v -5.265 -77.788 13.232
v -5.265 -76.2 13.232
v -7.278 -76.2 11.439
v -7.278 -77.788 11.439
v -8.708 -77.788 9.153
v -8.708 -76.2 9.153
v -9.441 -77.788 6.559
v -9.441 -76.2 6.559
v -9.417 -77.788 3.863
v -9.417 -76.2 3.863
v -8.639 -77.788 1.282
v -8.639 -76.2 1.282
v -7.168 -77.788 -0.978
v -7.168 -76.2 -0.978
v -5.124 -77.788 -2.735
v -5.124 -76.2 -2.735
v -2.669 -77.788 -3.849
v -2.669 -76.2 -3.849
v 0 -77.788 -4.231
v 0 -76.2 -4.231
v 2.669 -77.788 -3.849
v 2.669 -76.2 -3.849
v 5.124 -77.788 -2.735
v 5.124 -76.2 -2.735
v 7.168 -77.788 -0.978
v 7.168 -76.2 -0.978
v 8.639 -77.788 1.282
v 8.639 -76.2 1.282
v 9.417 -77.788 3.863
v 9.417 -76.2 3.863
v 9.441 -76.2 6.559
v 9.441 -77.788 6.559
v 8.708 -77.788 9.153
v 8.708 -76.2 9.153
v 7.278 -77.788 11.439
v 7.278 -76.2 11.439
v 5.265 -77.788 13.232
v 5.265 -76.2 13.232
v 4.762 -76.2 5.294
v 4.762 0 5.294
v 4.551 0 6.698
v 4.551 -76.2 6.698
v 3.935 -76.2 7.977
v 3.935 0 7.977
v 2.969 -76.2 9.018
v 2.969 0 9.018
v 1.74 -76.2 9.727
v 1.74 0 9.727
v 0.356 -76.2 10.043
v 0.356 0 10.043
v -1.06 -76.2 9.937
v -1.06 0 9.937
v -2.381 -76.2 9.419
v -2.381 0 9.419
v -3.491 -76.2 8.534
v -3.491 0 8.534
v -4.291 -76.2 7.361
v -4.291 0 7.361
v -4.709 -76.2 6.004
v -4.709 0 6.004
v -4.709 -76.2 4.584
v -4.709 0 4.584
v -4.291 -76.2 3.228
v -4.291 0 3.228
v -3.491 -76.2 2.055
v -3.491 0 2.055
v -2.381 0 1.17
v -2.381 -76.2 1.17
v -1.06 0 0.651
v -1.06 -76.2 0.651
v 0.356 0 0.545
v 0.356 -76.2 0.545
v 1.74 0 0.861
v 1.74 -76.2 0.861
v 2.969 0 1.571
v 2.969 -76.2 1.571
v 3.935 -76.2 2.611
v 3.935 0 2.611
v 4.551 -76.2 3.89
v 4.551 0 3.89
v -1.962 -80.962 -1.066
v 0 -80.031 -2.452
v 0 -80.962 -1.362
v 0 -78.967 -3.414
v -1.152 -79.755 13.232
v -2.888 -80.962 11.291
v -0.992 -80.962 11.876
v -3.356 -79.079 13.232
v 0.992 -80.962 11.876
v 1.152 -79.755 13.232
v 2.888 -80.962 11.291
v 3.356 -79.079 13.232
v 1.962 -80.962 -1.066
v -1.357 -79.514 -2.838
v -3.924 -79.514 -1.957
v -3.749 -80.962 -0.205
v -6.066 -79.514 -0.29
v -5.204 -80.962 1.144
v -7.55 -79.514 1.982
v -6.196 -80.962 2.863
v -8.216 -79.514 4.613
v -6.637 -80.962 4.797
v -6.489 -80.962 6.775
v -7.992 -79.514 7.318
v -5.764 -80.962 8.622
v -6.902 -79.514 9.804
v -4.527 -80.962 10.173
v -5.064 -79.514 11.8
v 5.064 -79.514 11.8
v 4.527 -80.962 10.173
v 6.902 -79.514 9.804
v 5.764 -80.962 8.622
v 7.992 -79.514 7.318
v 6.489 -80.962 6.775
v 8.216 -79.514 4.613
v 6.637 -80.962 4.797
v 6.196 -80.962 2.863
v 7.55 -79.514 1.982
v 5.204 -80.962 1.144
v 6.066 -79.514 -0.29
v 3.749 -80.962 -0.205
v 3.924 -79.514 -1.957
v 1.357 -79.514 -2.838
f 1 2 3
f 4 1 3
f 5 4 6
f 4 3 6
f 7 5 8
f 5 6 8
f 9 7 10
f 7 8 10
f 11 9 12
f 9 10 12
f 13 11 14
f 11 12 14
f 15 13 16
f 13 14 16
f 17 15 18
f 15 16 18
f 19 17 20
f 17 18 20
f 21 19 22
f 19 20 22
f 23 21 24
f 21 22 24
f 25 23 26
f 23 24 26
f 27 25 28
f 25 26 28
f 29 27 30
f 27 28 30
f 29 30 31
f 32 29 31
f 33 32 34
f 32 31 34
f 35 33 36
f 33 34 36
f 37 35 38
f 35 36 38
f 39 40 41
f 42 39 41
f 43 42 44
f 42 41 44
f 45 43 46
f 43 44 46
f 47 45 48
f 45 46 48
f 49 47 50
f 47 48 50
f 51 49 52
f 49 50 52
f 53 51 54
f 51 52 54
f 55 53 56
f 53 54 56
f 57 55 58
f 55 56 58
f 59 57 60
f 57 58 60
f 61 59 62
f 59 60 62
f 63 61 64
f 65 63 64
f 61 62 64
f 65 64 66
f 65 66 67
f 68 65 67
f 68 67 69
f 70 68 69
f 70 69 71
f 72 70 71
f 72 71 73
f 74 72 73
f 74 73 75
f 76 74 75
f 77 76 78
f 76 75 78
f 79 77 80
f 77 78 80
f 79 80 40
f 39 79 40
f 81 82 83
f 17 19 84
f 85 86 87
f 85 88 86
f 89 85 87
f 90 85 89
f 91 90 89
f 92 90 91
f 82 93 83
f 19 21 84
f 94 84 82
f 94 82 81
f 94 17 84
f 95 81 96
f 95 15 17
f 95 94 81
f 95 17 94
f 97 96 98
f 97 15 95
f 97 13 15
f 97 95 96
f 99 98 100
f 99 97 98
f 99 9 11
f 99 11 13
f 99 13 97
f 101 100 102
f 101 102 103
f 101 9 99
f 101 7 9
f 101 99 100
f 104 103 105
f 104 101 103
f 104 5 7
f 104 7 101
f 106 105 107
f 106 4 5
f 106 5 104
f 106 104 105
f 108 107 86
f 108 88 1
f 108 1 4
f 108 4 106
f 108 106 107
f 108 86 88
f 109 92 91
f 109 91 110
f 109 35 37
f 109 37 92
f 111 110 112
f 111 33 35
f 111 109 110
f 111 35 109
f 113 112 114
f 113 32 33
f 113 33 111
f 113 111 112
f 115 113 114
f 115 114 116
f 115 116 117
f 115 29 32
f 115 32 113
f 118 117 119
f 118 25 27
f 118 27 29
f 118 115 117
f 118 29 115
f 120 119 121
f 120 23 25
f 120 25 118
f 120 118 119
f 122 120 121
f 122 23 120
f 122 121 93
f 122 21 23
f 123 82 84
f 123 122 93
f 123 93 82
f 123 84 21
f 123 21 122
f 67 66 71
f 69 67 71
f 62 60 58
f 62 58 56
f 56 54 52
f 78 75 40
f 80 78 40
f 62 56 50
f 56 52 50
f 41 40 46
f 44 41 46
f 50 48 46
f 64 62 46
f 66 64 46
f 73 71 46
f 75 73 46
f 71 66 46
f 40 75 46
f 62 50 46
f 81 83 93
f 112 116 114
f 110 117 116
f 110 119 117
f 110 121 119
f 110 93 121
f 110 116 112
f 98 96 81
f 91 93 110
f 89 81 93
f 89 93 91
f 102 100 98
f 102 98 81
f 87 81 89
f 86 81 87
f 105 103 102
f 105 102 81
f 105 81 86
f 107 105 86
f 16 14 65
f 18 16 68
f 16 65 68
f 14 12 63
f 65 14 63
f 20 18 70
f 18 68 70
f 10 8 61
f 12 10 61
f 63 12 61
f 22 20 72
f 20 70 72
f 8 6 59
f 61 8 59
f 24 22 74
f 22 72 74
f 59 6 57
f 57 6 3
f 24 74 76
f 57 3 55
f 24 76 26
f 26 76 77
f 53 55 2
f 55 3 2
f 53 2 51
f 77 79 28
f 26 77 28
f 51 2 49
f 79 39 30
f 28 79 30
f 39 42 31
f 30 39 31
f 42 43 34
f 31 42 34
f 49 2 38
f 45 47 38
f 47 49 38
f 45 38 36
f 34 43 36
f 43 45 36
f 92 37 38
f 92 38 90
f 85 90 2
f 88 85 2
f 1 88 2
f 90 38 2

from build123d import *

# Parameters (mm, degrees)
F0_R     = 4.7625
F1_DEPTH = 76.2
F2_R     = 9.525
F2_R_2   = 4.7625
F3_DEPTH = 1.5875
F7_DEPTH = 25.4


# Not quite as in the source:
# - a length typed as a fraction of an inch, garbled in the dataset ("3 / 203.2 mm" for 3/8 in), is restored


with BuildPart() as f1:
    # F0 (on Front) → F1 (new body)
    with BuildSketch(Plane.XZ):
        with Locations((0, 5.2942009643)):
            Circle(F0_R)
    extrude(amount=F1_DEPTH)

    # F2 (on face) → F3 (join)
    with BuildSketch(Plane.XZ.offset(76.2)):
        with Locations((0, 5.2942009643)):
            Circle(F2_R)
        with Locations((0, 5.2942009643)):
            Circle(F2_R_2, mode=Mode.SUBTRACT)
        with Locations((0, 5.2942009643)):
            Circle(F2_R_2)
    extrude(amount=F3_DEPTH)

    # F4 (on Right) → F5 (revolve)
    with BuildSketch(Plane.YZ):
        with BuildLine():
            ThreePointArc((-80.9625, -1.3615326297), (-79.514423226, -2.9504452476), (-77.7875, -4.2307990357))
            Line((-77.7875, -4.2307990357), (-77.7875, 5.2942009643))
            Line((-77.7875, 5.2942009643), (-80.9625, 5.2942009643))
            Line((-80.9625, 5.2942009643), (-80.9625, -1.3615326297))
        make_face()
    revolve(axis=Axis((0, -79.375, 5.2942009643), (0, 1, 0)))

    # F6 (on face) → F7 (cut)
    with BuildSketch(Plane(origin=(0, -76.2, 0), x_dir=(-1, 0, 0), z_dir=(0, 1, 0))):
        with BuildLine():
            Line((0, 13.2317009643), (5.2651418547, 13.2317009643))
            ThreePointArc((5.2651418547, 13.2317009643), (0, 14.8192009643), (-5.2651418547, 13.2317009643))
            Line((-5.2651418547, 13.2317009643), (0, 13.2317009643))
        make_face()
    extrude(amount=-F7_DEPTH, mode=Mode.SUBTRACT)


solid = f1.part
